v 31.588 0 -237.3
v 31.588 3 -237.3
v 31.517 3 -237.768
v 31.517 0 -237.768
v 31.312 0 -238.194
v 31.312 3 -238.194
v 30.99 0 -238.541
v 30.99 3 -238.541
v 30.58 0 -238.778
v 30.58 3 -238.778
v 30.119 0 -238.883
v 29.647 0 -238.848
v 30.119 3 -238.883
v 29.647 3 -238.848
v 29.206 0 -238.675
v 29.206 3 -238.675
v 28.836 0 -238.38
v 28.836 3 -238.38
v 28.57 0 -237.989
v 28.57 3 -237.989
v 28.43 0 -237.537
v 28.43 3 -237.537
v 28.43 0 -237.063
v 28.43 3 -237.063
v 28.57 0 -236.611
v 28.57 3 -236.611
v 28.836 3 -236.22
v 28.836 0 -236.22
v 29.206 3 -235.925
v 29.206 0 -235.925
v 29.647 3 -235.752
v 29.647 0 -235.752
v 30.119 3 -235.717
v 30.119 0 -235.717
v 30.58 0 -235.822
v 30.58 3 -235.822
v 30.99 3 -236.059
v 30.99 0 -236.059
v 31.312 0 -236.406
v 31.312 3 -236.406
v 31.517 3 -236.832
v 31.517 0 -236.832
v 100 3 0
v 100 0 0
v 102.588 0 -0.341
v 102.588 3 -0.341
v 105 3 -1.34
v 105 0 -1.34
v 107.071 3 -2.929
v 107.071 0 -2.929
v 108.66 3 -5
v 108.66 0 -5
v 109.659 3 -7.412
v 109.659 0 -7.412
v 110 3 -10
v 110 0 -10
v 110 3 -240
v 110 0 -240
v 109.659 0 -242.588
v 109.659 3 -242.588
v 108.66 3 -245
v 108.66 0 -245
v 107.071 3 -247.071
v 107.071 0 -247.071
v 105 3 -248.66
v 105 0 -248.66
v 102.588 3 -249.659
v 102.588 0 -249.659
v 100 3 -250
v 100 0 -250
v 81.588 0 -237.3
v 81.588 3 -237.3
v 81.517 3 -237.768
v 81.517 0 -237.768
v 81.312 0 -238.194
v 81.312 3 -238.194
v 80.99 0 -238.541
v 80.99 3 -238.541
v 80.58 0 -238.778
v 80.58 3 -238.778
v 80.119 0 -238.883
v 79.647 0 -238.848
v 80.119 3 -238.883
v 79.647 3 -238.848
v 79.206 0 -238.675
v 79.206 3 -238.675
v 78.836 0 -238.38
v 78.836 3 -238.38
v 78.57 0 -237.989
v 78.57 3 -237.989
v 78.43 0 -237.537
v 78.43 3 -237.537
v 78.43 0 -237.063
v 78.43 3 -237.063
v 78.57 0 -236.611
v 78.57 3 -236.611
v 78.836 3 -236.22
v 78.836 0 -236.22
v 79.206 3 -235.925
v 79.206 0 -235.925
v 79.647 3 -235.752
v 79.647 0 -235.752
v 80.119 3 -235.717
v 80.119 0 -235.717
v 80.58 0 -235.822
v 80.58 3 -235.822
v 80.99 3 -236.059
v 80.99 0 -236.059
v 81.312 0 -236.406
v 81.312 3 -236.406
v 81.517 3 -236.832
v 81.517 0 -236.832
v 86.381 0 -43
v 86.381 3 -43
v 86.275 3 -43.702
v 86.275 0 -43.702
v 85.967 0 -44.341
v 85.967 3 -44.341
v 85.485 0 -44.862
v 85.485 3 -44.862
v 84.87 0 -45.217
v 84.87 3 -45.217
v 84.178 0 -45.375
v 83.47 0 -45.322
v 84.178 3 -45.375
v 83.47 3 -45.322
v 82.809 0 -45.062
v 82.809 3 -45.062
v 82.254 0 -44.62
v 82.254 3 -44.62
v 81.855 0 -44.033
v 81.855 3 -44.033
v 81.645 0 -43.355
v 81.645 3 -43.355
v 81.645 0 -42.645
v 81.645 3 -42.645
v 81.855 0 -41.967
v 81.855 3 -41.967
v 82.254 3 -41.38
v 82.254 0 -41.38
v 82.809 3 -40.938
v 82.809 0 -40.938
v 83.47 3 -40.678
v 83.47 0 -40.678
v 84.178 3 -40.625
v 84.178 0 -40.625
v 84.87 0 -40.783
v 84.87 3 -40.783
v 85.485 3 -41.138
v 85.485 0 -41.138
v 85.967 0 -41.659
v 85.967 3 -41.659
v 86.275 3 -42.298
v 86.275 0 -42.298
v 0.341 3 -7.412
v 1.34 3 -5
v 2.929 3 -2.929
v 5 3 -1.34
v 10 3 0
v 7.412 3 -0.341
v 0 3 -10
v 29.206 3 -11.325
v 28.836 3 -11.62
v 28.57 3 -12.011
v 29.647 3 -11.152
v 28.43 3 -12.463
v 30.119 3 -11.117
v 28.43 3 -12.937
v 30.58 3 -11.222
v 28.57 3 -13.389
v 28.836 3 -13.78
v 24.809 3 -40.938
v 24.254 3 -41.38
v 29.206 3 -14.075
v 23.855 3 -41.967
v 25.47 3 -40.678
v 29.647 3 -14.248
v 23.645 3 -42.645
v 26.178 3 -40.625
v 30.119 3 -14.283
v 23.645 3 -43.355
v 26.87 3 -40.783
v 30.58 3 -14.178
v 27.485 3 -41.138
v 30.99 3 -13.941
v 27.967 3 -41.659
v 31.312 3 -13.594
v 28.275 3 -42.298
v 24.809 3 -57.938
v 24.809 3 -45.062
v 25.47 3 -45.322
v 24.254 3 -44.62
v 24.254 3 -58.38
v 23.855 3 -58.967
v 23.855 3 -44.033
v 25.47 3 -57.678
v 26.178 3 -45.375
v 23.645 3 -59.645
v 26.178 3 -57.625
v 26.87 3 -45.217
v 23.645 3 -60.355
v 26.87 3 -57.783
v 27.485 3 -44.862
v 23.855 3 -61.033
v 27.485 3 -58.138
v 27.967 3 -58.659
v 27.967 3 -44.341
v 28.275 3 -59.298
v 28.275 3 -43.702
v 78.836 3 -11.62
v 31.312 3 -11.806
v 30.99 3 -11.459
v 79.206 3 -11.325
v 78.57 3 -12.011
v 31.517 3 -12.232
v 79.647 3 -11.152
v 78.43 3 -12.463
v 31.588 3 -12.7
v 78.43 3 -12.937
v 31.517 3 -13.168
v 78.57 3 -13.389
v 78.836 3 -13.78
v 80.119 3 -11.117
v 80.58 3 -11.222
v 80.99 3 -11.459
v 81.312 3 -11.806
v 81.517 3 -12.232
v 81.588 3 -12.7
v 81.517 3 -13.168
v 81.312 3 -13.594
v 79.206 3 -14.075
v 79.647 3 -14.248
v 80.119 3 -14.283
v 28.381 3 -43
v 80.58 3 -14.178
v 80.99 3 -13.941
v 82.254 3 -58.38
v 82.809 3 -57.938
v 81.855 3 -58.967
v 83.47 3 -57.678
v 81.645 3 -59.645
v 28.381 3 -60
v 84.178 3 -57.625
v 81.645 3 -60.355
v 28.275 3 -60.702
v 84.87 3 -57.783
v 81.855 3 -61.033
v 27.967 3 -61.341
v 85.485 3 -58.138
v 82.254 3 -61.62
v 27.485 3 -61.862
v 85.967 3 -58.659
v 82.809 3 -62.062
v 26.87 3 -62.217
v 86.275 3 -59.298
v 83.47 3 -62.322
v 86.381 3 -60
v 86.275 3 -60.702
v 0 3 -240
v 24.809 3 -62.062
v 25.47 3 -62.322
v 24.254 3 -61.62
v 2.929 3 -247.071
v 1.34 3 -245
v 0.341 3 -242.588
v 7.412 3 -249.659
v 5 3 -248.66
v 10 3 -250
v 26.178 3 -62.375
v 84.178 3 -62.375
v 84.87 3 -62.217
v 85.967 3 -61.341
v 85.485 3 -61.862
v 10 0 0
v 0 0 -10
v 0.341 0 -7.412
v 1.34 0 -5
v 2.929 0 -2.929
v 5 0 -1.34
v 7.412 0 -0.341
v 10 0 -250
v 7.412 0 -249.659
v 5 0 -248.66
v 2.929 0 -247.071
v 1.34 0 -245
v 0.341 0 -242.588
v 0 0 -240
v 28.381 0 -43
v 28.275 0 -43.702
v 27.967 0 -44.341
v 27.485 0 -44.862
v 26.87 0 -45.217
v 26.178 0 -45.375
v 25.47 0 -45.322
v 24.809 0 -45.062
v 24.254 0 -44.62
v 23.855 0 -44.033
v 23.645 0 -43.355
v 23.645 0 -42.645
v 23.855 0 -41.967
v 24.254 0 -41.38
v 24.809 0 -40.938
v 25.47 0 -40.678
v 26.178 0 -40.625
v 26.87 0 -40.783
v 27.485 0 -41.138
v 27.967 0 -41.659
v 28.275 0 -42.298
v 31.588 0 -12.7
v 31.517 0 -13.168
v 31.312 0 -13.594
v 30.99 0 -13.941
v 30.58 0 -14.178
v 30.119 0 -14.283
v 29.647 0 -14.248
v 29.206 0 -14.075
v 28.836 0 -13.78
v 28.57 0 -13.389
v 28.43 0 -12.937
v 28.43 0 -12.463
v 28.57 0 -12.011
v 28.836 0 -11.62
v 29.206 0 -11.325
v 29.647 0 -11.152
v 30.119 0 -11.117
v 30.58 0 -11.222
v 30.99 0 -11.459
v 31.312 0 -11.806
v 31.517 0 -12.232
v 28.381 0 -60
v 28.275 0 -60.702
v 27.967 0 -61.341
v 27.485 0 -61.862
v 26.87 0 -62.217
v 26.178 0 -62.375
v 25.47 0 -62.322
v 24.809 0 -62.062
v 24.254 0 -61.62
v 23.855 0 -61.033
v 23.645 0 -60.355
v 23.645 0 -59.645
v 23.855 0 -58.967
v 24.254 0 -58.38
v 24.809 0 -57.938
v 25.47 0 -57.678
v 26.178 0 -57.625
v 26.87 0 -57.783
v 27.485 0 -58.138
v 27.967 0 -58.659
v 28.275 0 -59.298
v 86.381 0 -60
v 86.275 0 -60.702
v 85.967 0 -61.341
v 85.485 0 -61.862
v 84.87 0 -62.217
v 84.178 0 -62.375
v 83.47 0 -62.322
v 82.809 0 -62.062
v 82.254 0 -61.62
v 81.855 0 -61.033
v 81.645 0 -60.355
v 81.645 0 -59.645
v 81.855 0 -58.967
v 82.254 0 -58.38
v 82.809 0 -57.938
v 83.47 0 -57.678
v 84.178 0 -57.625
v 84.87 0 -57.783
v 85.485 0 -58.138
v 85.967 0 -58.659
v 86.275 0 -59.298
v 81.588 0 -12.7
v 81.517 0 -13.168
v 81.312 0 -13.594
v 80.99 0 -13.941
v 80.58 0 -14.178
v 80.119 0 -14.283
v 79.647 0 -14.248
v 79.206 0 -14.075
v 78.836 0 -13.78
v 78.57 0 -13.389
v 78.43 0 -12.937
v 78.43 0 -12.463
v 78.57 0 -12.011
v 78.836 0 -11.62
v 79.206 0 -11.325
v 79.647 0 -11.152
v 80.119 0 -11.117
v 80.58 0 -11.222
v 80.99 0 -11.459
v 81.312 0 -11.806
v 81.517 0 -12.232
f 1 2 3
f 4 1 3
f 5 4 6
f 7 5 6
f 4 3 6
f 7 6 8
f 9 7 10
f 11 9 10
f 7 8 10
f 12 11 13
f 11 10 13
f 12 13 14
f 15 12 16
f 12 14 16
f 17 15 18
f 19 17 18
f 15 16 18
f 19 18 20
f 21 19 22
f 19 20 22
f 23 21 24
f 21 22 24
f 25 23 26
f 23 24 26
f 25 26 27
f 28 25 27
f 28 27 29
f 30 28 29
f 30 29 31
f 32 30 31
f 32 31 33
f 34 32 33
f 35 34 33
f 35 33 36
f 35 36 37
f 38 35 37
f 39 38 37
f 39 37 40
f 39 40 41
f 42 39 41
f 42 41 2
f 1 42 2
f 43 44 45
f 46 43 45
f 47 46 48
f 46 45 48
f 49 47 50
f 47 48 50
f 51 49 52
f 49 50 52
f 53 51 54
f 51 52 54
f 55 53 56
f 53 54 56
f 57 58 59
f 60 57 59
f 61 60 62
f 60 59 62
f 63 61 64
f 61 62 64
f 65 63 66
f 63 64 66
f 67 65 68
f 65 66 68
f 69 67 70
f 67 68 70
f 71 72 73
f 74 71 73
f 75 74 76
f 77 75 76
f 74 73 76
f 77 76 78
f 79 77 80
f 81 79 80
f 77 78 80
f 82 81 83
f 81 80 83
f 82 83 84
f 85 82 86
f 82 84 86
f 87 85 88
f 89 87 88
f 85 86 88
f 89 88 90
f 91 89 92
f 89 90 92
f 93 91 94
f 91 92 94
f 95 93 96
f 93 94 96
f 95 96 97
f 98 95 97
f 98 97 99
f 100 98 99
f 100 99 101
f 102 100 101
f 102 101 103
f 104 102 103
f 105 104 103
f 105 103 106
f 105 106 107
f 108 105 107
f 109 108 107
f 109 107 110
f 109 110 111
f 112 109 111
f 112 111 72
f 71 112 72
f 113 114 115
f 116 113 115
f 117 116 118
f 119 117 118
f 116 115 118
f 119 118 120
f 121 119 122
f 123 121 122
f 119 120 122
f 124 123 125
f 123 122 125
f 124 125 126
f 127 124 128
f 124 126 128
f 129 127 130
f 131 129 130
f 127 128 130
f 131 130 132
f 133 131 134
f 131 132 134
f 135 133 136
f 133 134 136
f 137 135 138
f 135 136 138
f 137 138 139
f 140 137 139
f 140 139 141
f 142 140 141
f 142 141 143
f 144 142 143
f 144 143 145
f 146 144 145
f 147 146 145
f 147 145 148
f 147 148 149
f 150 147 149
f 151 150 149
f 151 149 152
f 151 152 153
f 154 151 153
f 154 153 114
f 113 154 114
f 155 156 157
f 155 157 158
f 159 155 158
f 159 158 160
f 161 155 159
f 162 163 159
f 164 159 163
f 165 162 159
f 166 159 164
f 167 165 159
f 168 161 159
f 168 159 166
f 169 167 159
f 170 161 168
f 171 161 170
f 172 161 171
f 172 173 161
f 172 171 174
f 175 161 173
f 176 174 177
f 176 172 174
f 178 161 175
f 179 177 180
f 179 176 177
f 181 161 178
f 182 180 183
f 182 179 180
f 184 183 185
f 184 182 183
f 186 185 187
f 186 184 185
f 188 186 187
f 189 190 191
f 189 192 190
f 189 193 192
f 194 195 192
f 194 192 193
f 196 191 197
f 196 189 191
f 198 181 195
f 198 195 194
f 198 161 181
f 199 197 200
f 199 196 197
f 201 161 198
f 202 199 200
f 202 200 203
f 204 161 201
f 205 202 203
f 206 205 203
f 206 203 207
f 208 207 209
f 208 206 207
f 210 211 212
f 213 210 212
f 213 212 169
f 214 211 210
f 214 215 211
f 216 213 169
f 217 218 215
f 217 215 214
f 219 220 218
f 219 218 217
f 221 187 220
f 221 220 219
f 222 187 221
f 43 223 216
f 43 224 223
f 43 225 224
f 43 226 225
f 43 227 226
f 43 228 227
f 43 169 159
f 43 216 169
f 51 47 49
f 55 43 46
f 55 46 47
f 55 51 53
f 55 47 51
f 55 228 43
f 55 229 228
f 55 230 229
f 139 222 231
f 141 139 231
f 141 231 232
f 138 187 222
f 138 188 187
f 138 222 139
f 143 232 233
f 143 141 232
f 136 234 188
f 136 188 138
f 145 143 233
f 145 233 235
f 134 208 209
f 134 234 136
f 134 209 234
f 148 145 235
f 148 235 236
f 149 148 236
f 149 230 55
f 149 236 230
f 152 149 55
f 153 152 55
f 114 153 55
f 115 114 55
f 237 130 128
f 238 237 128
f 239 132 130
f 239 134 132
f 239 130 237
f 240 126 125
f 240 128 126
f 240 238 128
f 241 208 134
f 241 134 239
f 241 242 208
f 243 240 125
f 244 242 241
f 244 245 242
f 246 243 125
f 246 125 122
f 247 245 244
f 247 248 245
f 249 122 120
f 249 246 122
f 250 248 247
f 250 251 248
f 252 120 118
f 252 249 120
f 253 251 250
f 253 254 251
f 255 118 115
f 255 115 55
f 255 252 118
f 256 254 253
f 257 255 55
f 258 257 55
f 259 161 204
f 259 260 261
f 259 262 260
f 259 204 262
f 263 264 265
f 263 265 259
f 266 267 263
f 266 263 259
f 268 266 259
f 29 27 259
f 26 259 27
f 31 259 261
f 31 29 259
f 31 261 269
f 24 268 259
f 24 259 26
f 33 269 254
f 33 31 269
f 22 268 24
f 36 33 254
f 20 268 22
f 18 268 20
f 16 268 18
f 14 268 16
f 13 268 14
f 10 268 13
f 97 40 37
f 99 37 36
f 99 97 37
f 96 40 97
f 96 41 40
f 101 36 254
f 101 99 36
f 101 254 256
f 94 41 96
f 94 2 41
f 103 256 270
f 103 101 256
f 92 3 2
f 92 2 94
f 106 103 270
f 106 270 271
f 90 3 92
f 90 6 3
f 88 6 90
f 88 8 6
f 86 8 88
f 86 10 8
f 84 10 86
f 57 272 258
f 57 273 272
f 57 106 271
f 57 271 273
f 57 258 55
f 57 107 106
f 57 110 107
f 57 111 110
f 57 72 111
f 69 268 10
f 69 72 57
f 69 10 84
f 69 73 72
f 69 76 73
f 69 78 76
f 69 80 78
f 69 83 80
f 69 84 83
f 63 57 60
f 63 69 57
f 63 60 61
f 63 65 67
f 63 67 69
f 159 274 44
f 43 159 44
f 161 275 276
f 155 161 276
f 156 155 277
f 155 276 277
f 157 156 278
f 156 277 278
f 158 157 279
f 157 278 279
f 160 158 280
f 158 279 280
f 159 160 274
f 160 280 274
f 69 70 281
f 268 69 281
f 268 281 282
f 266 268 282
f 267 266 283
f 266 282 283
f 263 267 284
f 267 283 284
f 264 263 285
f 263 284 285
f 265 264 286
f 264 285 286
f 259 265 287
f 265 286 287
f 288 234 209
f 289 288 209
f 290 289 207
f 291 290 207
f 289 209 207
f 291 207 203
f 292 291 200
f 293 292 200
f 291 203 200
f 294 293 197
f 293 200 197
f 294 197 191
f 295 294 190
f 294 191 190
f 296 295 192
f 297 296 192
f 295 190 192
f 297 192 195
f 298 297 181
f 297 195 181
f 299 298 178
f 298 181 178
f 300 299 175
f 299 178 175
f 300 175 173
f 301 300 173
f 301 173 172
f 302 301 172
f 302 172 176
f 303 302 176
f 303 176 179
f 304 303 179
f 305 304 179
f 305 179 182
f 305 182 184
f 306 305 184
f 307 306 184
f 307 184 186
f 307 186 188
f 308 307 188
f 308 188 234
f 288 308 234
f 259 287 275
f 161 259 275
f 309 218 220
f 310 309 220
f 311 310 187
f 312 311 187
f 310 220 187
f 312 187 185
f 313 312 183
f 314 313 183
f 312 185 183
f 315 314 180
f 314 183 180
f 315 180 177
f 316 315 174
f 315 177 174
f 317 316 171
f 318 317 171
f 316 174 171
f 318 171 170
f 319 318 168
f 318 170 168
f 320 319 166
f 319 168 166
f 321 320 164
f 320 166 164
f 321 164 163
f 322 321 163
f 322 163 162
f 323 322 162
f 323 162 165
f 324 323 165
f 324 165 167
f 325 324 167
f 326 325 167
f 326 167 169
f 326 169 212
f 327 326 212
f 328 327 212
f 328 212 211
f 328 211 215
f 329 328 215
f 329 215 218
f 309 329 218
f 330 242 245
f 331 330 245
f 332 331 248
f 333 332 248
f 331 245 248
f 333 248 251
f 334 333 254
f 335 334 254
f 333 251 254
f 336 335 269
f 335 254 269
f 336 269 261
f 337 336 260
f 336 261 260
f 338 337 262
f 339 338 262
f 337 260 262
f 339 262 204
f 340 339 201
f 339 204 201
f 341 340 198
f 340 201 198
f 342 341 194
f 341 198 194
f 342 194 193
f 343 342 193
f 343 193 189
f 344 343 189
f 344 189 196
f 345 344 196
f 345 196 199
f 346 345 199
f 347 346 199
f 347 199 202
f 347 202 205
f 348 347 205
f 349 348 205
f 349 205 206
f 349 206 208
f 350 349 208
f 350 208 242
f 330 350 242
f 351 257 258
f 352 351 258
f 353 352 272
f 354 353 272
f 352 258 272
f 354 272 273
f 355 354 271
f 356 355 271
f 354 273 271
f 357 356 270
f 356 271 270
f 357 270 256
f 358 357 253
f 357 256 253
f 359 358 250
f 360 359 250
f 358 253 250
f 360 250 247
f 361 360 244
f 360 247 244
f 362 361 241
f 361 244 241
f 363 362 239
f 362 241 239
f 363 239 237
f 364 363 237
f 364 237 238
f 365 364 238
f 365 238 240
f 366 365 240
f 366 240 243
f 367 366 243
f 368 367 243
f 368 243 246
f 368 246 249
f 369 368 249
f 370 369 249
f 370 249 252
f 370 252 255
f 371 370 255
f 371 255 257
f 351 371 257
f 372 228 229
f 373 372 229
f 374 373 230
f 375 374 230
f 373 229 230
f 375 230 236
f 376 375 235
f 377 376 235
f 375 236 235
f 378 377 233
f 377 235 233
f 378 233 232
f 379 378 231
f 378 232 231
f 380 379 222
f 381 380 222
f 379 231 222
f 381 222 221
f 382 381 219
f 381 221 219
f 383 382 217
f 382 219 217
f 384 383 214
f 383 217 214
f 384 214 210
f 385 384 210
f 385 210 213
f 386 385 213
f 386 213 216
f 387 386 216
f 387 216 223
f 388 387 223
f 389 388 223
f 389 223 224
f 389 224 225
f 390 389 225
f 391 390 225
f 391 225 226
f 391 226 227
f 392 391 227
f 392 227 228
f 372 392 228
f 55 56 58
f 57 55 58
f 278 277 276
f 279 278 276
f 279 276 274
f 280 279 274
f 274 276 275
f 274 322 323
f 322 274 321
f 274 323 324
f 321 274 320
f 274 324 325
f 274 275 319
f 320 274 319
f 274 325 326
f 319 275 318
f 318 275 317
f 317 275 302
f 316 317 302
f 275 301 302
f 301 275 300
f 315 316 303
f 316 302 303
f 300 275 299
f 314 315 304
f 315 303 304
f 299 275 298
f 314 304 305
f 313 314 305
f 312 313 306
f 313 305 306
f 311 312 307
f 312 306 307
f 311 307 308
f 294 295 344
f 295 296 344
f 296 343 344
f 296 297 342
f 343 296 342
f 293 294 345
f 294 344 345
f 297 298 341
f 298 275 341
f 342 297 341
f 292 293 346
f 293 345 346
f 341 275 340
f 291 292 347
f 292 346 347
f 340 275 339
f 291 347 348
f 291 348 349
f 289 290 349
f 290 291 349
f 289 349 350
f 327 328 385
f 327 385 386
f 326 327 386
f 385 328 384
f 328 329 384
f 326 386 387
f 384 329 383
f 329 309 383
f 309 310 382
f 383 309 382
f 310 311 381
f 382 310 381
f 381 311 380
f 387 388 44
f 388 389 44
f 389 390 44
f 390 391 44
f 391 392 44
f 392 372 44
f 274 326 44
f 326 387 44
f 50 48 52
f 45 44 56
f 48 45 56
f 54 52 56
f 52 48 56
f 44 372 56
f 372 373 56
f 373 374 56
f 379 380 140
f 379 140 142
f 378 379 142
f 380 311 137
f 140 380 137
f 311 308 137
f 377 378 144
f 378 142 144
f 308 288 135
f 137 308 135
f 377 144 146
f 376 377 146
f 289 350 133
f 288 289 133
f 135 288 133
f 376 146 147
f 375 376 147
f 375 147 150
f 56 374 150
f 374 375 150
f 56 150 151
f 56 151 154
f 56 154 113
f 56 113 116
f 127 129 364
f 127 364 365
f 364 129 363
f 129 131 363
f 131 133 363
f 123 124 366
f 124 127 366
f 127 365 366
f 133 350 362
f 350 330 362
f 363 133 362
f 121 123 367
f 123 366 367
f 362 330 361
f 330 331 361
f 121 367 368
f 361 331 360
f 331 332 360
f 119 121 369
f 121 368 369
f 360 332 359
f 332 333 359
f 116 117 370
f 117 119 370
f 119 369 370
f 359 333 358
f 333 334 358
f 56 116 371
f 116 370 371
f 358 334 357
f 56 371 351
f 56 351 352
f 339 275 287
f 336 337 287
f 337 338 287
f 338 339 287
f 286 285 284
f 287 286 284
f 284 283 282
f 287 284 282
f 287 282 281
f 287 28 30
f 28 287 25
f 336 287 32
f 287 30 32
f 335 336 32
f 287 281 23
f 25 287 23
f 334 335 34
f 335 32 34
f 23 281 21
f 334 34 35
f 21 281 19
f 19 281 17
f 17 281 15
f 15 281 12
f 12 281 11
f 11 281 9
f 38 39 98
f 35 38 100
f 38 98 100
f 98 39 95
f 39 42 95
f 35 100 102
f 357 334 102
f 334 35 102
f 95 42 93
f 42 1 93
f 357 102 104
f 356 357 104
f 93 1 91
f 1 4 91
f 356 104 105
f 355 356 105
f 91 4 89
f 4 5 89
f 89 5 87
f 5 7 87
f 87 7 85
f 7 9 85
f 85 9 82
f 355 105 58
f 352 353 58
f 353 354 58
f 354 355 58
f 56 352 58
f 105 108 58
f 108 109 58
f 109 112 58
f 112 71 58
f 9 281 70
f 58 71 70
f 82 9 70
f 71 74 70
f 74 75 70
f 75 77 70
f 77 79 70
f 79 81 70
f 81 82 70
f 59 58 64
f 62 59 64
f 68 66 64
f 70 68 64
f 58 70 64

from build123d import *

# Parameters (mm, degrees)
SALIENTE_EXTRUIR1_DEPTH = 3
CROQUIS2_R              = 1.5875
CORTAR_EXTRUIR1_DEPTH   = 20
CROQUIS3_R              = 2.38125
CORTAR_EXTRUIR2_DEPTH   = 10


with BuildPart() as part:
    # Croquis1 → Saliente-Extruir1 (new body)
    with BuildSketch(Plane(origin=(0, 0, 0), x_dir=(1, 0, 0), z_dir=(0, 1, 0))):
        with BuildLine():
            Line((10, 0), (100, 0))
            ThreePointArc((100, 0), (107.071067812, 2.928932188), (110, 10))
            Line((110, 10), (110, 240))
            ThreePointArc((110, 240), (107.071067812, 247.071067812), (100, 250))
            Line((100, 250), (10, 250))
            ThreePointArc((10, 250), (2.928932188, 247.071067812), (0, 240))
            Line((0, 240), (0, 10))
            ThreePointArc((0, 10), (2.928932188, 2.928932188), (10, 0))
        make_face()
    extrude(amount=SALIENTE_EXTRUIR1_DEPTH)

    # Croquis2 → Cortar-Extruir1 (cut)
    with BuildSketch(Plane(origin=(0, 3, 0), x_dir=(1, 0, 0), z_dir=(0, 1, 0))):
        with Locations((30, 237.3)):
            Circle(CROQUIS2_R)
        with Locations((80, 237.3)):
            Circle(CROQUIS2_R)
        with Locations((30, 12.7)):
            Circle(CROQUIS2_R)
        with Locations((80, 12.7)):
            Circle(CROQUIS2_R)
    extrude(amount=-CORTAR_EXTRUIR1_DEPTH, mode=Mode.SUBTRACT)

    # Croquis3 → Cortar-Extruir2 (cut)
    with BuildSketch(Plane(origin=(0, 3, 0), x_dir=(1, 0, 0), z_dir=(0, 1, 0))):
        with Locations((26, 60)):
            Circle(CROQUIS3_R)
        with Locations((84, 60)):
            Circle(CROQUIS3_R)
        with Locations((26, 43)):
            Circle(CROQUIS3_R)
        with Locations((84, 43)):
            Circle(CROQUIS3_R)
    extrude(amount=-CORTAR_EXTRUIR2_DEPTH, mode=Mode.SUBTRACT)


solid = part.part
